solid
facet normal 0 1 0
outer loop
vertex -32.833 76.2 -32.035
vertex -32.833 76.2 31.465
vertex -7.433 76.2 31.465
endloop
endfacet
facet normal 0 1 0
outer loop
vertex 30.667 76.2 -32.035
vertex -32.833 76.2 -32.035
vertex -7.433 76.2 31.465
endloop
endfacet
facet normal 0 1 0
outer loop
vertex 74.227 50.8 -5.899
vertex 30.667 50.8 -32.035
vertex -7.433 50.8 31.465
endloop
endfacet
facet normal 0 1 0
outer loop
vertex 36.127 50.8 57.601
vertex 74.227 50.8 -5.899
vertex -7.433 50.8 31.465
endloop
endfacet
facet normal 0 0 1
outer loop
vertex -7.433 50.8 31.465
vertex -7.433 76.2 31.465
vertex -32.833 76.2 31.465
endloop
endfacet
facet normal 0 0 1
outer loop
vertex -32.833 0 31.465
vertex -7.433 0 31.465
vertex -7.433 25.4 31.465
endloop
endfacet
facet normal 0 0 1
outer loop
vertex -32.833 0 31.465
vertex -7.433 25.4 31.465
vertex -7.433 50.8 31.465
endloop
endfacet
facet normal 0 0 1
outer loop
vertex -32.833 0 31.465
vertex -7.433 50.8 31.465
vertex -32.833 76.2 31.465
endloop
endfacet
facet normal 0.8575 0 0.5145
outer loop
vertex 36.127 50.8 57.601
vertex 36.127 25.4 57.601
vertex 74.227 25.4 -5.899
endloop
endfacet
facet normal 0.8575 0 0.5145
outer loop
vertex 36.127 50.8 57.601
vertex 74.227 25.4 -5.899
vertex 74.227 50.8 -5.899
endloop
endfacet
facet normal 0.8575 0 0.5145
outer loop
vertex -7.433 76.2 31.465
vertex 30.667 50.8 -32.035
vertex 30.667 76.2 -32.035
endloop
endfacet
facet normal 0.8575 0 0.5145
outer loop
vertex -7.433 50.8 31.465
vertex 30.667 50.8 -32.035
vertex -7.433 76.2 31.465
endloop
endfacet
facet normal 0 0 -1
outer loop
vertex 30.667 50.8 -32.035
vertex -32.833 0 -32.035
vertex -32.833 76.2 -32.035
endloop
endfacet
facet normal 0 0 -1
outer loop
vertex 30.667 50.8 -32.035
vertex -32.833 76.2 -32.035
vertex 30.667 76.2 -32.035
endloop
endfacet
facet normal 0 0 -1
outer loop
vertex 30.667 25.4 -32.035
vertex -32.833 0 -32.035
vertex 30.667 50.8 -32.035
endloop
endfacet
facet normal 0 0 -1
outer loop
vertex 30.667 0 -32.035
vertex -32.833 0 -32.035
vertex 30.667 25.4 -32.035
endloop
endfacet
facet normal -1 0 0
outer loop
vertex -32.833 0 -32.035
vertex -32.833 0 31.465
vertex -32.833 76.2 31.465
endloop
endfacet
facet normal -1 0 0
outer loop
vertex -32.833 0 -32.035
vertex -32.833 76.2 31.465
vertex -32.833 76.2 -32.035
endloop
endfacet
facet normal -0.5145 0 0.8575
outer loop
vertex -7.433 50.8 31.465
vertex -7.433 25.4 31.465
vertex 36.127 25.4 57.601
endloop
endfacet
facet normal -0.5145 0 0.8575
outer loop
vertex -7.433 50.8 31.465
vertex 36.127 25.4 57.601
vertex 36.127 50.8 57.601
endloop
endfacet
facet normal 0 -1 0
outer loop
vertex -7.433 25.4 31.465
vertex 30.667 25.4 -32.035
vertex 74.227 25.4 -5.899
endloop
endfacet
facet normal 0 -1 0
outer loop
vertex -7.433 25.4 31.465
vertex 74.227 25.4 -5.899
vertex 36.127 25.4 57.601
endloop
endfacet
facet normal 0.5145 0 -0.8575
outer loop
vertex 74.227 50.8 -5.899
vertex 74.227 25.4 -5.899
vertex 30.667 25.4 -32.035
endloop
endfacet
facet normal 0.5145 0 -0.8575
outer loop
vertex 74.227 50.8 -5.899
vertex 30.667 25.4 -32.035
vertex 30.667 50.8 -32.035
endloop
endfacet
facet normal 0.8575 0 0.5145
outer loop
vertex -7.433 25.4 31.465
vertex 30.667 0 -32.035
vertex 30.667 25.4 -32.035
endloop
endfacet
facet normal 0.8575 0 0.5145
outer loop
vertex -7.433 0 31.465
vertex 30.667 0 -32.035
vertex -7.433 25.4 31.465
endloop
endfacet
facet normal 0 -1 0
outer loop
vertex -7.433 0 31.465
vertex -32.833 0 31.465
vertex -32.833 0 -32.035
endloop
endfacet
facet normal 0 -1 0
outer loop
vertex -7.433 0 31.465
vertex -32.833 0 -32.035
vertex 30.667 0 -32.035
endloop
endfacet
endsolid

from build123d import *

# Parameters (mm, degrees)
F1_DEPTH = 76.2
F2_W     = 25.4
F2_H     = 74.0530890645
F3_DEPTH = 50.8


with BuildPart() as f1:
    # F0 (on Front) → F1 (new body)
    with BuildSketch(Plane.XZ):
        Polygon((-32.8333097622, 31.4650478065), (-32.8333097622, -32.0349521935), (30.6666902378, -32.0349521935), (-7.4333097622, 31.4650478065), align=None)
    extrude(amount=-F1_DEPTH)

    # F2 (on face) → F3 (join)
    with BuildSketch(Plane(origin=(8.4159697954, 0, 5.0495818772), x_dir=(0, 1, 0), z_dir=(0.8574929257, 0, 0.5144957554))):
        with Locations((38.1, -6.2210823096)):
            Rectangle(F2_W, F2_H)
    extrude(amount=F3_DEPTH)


solid = f1.part
